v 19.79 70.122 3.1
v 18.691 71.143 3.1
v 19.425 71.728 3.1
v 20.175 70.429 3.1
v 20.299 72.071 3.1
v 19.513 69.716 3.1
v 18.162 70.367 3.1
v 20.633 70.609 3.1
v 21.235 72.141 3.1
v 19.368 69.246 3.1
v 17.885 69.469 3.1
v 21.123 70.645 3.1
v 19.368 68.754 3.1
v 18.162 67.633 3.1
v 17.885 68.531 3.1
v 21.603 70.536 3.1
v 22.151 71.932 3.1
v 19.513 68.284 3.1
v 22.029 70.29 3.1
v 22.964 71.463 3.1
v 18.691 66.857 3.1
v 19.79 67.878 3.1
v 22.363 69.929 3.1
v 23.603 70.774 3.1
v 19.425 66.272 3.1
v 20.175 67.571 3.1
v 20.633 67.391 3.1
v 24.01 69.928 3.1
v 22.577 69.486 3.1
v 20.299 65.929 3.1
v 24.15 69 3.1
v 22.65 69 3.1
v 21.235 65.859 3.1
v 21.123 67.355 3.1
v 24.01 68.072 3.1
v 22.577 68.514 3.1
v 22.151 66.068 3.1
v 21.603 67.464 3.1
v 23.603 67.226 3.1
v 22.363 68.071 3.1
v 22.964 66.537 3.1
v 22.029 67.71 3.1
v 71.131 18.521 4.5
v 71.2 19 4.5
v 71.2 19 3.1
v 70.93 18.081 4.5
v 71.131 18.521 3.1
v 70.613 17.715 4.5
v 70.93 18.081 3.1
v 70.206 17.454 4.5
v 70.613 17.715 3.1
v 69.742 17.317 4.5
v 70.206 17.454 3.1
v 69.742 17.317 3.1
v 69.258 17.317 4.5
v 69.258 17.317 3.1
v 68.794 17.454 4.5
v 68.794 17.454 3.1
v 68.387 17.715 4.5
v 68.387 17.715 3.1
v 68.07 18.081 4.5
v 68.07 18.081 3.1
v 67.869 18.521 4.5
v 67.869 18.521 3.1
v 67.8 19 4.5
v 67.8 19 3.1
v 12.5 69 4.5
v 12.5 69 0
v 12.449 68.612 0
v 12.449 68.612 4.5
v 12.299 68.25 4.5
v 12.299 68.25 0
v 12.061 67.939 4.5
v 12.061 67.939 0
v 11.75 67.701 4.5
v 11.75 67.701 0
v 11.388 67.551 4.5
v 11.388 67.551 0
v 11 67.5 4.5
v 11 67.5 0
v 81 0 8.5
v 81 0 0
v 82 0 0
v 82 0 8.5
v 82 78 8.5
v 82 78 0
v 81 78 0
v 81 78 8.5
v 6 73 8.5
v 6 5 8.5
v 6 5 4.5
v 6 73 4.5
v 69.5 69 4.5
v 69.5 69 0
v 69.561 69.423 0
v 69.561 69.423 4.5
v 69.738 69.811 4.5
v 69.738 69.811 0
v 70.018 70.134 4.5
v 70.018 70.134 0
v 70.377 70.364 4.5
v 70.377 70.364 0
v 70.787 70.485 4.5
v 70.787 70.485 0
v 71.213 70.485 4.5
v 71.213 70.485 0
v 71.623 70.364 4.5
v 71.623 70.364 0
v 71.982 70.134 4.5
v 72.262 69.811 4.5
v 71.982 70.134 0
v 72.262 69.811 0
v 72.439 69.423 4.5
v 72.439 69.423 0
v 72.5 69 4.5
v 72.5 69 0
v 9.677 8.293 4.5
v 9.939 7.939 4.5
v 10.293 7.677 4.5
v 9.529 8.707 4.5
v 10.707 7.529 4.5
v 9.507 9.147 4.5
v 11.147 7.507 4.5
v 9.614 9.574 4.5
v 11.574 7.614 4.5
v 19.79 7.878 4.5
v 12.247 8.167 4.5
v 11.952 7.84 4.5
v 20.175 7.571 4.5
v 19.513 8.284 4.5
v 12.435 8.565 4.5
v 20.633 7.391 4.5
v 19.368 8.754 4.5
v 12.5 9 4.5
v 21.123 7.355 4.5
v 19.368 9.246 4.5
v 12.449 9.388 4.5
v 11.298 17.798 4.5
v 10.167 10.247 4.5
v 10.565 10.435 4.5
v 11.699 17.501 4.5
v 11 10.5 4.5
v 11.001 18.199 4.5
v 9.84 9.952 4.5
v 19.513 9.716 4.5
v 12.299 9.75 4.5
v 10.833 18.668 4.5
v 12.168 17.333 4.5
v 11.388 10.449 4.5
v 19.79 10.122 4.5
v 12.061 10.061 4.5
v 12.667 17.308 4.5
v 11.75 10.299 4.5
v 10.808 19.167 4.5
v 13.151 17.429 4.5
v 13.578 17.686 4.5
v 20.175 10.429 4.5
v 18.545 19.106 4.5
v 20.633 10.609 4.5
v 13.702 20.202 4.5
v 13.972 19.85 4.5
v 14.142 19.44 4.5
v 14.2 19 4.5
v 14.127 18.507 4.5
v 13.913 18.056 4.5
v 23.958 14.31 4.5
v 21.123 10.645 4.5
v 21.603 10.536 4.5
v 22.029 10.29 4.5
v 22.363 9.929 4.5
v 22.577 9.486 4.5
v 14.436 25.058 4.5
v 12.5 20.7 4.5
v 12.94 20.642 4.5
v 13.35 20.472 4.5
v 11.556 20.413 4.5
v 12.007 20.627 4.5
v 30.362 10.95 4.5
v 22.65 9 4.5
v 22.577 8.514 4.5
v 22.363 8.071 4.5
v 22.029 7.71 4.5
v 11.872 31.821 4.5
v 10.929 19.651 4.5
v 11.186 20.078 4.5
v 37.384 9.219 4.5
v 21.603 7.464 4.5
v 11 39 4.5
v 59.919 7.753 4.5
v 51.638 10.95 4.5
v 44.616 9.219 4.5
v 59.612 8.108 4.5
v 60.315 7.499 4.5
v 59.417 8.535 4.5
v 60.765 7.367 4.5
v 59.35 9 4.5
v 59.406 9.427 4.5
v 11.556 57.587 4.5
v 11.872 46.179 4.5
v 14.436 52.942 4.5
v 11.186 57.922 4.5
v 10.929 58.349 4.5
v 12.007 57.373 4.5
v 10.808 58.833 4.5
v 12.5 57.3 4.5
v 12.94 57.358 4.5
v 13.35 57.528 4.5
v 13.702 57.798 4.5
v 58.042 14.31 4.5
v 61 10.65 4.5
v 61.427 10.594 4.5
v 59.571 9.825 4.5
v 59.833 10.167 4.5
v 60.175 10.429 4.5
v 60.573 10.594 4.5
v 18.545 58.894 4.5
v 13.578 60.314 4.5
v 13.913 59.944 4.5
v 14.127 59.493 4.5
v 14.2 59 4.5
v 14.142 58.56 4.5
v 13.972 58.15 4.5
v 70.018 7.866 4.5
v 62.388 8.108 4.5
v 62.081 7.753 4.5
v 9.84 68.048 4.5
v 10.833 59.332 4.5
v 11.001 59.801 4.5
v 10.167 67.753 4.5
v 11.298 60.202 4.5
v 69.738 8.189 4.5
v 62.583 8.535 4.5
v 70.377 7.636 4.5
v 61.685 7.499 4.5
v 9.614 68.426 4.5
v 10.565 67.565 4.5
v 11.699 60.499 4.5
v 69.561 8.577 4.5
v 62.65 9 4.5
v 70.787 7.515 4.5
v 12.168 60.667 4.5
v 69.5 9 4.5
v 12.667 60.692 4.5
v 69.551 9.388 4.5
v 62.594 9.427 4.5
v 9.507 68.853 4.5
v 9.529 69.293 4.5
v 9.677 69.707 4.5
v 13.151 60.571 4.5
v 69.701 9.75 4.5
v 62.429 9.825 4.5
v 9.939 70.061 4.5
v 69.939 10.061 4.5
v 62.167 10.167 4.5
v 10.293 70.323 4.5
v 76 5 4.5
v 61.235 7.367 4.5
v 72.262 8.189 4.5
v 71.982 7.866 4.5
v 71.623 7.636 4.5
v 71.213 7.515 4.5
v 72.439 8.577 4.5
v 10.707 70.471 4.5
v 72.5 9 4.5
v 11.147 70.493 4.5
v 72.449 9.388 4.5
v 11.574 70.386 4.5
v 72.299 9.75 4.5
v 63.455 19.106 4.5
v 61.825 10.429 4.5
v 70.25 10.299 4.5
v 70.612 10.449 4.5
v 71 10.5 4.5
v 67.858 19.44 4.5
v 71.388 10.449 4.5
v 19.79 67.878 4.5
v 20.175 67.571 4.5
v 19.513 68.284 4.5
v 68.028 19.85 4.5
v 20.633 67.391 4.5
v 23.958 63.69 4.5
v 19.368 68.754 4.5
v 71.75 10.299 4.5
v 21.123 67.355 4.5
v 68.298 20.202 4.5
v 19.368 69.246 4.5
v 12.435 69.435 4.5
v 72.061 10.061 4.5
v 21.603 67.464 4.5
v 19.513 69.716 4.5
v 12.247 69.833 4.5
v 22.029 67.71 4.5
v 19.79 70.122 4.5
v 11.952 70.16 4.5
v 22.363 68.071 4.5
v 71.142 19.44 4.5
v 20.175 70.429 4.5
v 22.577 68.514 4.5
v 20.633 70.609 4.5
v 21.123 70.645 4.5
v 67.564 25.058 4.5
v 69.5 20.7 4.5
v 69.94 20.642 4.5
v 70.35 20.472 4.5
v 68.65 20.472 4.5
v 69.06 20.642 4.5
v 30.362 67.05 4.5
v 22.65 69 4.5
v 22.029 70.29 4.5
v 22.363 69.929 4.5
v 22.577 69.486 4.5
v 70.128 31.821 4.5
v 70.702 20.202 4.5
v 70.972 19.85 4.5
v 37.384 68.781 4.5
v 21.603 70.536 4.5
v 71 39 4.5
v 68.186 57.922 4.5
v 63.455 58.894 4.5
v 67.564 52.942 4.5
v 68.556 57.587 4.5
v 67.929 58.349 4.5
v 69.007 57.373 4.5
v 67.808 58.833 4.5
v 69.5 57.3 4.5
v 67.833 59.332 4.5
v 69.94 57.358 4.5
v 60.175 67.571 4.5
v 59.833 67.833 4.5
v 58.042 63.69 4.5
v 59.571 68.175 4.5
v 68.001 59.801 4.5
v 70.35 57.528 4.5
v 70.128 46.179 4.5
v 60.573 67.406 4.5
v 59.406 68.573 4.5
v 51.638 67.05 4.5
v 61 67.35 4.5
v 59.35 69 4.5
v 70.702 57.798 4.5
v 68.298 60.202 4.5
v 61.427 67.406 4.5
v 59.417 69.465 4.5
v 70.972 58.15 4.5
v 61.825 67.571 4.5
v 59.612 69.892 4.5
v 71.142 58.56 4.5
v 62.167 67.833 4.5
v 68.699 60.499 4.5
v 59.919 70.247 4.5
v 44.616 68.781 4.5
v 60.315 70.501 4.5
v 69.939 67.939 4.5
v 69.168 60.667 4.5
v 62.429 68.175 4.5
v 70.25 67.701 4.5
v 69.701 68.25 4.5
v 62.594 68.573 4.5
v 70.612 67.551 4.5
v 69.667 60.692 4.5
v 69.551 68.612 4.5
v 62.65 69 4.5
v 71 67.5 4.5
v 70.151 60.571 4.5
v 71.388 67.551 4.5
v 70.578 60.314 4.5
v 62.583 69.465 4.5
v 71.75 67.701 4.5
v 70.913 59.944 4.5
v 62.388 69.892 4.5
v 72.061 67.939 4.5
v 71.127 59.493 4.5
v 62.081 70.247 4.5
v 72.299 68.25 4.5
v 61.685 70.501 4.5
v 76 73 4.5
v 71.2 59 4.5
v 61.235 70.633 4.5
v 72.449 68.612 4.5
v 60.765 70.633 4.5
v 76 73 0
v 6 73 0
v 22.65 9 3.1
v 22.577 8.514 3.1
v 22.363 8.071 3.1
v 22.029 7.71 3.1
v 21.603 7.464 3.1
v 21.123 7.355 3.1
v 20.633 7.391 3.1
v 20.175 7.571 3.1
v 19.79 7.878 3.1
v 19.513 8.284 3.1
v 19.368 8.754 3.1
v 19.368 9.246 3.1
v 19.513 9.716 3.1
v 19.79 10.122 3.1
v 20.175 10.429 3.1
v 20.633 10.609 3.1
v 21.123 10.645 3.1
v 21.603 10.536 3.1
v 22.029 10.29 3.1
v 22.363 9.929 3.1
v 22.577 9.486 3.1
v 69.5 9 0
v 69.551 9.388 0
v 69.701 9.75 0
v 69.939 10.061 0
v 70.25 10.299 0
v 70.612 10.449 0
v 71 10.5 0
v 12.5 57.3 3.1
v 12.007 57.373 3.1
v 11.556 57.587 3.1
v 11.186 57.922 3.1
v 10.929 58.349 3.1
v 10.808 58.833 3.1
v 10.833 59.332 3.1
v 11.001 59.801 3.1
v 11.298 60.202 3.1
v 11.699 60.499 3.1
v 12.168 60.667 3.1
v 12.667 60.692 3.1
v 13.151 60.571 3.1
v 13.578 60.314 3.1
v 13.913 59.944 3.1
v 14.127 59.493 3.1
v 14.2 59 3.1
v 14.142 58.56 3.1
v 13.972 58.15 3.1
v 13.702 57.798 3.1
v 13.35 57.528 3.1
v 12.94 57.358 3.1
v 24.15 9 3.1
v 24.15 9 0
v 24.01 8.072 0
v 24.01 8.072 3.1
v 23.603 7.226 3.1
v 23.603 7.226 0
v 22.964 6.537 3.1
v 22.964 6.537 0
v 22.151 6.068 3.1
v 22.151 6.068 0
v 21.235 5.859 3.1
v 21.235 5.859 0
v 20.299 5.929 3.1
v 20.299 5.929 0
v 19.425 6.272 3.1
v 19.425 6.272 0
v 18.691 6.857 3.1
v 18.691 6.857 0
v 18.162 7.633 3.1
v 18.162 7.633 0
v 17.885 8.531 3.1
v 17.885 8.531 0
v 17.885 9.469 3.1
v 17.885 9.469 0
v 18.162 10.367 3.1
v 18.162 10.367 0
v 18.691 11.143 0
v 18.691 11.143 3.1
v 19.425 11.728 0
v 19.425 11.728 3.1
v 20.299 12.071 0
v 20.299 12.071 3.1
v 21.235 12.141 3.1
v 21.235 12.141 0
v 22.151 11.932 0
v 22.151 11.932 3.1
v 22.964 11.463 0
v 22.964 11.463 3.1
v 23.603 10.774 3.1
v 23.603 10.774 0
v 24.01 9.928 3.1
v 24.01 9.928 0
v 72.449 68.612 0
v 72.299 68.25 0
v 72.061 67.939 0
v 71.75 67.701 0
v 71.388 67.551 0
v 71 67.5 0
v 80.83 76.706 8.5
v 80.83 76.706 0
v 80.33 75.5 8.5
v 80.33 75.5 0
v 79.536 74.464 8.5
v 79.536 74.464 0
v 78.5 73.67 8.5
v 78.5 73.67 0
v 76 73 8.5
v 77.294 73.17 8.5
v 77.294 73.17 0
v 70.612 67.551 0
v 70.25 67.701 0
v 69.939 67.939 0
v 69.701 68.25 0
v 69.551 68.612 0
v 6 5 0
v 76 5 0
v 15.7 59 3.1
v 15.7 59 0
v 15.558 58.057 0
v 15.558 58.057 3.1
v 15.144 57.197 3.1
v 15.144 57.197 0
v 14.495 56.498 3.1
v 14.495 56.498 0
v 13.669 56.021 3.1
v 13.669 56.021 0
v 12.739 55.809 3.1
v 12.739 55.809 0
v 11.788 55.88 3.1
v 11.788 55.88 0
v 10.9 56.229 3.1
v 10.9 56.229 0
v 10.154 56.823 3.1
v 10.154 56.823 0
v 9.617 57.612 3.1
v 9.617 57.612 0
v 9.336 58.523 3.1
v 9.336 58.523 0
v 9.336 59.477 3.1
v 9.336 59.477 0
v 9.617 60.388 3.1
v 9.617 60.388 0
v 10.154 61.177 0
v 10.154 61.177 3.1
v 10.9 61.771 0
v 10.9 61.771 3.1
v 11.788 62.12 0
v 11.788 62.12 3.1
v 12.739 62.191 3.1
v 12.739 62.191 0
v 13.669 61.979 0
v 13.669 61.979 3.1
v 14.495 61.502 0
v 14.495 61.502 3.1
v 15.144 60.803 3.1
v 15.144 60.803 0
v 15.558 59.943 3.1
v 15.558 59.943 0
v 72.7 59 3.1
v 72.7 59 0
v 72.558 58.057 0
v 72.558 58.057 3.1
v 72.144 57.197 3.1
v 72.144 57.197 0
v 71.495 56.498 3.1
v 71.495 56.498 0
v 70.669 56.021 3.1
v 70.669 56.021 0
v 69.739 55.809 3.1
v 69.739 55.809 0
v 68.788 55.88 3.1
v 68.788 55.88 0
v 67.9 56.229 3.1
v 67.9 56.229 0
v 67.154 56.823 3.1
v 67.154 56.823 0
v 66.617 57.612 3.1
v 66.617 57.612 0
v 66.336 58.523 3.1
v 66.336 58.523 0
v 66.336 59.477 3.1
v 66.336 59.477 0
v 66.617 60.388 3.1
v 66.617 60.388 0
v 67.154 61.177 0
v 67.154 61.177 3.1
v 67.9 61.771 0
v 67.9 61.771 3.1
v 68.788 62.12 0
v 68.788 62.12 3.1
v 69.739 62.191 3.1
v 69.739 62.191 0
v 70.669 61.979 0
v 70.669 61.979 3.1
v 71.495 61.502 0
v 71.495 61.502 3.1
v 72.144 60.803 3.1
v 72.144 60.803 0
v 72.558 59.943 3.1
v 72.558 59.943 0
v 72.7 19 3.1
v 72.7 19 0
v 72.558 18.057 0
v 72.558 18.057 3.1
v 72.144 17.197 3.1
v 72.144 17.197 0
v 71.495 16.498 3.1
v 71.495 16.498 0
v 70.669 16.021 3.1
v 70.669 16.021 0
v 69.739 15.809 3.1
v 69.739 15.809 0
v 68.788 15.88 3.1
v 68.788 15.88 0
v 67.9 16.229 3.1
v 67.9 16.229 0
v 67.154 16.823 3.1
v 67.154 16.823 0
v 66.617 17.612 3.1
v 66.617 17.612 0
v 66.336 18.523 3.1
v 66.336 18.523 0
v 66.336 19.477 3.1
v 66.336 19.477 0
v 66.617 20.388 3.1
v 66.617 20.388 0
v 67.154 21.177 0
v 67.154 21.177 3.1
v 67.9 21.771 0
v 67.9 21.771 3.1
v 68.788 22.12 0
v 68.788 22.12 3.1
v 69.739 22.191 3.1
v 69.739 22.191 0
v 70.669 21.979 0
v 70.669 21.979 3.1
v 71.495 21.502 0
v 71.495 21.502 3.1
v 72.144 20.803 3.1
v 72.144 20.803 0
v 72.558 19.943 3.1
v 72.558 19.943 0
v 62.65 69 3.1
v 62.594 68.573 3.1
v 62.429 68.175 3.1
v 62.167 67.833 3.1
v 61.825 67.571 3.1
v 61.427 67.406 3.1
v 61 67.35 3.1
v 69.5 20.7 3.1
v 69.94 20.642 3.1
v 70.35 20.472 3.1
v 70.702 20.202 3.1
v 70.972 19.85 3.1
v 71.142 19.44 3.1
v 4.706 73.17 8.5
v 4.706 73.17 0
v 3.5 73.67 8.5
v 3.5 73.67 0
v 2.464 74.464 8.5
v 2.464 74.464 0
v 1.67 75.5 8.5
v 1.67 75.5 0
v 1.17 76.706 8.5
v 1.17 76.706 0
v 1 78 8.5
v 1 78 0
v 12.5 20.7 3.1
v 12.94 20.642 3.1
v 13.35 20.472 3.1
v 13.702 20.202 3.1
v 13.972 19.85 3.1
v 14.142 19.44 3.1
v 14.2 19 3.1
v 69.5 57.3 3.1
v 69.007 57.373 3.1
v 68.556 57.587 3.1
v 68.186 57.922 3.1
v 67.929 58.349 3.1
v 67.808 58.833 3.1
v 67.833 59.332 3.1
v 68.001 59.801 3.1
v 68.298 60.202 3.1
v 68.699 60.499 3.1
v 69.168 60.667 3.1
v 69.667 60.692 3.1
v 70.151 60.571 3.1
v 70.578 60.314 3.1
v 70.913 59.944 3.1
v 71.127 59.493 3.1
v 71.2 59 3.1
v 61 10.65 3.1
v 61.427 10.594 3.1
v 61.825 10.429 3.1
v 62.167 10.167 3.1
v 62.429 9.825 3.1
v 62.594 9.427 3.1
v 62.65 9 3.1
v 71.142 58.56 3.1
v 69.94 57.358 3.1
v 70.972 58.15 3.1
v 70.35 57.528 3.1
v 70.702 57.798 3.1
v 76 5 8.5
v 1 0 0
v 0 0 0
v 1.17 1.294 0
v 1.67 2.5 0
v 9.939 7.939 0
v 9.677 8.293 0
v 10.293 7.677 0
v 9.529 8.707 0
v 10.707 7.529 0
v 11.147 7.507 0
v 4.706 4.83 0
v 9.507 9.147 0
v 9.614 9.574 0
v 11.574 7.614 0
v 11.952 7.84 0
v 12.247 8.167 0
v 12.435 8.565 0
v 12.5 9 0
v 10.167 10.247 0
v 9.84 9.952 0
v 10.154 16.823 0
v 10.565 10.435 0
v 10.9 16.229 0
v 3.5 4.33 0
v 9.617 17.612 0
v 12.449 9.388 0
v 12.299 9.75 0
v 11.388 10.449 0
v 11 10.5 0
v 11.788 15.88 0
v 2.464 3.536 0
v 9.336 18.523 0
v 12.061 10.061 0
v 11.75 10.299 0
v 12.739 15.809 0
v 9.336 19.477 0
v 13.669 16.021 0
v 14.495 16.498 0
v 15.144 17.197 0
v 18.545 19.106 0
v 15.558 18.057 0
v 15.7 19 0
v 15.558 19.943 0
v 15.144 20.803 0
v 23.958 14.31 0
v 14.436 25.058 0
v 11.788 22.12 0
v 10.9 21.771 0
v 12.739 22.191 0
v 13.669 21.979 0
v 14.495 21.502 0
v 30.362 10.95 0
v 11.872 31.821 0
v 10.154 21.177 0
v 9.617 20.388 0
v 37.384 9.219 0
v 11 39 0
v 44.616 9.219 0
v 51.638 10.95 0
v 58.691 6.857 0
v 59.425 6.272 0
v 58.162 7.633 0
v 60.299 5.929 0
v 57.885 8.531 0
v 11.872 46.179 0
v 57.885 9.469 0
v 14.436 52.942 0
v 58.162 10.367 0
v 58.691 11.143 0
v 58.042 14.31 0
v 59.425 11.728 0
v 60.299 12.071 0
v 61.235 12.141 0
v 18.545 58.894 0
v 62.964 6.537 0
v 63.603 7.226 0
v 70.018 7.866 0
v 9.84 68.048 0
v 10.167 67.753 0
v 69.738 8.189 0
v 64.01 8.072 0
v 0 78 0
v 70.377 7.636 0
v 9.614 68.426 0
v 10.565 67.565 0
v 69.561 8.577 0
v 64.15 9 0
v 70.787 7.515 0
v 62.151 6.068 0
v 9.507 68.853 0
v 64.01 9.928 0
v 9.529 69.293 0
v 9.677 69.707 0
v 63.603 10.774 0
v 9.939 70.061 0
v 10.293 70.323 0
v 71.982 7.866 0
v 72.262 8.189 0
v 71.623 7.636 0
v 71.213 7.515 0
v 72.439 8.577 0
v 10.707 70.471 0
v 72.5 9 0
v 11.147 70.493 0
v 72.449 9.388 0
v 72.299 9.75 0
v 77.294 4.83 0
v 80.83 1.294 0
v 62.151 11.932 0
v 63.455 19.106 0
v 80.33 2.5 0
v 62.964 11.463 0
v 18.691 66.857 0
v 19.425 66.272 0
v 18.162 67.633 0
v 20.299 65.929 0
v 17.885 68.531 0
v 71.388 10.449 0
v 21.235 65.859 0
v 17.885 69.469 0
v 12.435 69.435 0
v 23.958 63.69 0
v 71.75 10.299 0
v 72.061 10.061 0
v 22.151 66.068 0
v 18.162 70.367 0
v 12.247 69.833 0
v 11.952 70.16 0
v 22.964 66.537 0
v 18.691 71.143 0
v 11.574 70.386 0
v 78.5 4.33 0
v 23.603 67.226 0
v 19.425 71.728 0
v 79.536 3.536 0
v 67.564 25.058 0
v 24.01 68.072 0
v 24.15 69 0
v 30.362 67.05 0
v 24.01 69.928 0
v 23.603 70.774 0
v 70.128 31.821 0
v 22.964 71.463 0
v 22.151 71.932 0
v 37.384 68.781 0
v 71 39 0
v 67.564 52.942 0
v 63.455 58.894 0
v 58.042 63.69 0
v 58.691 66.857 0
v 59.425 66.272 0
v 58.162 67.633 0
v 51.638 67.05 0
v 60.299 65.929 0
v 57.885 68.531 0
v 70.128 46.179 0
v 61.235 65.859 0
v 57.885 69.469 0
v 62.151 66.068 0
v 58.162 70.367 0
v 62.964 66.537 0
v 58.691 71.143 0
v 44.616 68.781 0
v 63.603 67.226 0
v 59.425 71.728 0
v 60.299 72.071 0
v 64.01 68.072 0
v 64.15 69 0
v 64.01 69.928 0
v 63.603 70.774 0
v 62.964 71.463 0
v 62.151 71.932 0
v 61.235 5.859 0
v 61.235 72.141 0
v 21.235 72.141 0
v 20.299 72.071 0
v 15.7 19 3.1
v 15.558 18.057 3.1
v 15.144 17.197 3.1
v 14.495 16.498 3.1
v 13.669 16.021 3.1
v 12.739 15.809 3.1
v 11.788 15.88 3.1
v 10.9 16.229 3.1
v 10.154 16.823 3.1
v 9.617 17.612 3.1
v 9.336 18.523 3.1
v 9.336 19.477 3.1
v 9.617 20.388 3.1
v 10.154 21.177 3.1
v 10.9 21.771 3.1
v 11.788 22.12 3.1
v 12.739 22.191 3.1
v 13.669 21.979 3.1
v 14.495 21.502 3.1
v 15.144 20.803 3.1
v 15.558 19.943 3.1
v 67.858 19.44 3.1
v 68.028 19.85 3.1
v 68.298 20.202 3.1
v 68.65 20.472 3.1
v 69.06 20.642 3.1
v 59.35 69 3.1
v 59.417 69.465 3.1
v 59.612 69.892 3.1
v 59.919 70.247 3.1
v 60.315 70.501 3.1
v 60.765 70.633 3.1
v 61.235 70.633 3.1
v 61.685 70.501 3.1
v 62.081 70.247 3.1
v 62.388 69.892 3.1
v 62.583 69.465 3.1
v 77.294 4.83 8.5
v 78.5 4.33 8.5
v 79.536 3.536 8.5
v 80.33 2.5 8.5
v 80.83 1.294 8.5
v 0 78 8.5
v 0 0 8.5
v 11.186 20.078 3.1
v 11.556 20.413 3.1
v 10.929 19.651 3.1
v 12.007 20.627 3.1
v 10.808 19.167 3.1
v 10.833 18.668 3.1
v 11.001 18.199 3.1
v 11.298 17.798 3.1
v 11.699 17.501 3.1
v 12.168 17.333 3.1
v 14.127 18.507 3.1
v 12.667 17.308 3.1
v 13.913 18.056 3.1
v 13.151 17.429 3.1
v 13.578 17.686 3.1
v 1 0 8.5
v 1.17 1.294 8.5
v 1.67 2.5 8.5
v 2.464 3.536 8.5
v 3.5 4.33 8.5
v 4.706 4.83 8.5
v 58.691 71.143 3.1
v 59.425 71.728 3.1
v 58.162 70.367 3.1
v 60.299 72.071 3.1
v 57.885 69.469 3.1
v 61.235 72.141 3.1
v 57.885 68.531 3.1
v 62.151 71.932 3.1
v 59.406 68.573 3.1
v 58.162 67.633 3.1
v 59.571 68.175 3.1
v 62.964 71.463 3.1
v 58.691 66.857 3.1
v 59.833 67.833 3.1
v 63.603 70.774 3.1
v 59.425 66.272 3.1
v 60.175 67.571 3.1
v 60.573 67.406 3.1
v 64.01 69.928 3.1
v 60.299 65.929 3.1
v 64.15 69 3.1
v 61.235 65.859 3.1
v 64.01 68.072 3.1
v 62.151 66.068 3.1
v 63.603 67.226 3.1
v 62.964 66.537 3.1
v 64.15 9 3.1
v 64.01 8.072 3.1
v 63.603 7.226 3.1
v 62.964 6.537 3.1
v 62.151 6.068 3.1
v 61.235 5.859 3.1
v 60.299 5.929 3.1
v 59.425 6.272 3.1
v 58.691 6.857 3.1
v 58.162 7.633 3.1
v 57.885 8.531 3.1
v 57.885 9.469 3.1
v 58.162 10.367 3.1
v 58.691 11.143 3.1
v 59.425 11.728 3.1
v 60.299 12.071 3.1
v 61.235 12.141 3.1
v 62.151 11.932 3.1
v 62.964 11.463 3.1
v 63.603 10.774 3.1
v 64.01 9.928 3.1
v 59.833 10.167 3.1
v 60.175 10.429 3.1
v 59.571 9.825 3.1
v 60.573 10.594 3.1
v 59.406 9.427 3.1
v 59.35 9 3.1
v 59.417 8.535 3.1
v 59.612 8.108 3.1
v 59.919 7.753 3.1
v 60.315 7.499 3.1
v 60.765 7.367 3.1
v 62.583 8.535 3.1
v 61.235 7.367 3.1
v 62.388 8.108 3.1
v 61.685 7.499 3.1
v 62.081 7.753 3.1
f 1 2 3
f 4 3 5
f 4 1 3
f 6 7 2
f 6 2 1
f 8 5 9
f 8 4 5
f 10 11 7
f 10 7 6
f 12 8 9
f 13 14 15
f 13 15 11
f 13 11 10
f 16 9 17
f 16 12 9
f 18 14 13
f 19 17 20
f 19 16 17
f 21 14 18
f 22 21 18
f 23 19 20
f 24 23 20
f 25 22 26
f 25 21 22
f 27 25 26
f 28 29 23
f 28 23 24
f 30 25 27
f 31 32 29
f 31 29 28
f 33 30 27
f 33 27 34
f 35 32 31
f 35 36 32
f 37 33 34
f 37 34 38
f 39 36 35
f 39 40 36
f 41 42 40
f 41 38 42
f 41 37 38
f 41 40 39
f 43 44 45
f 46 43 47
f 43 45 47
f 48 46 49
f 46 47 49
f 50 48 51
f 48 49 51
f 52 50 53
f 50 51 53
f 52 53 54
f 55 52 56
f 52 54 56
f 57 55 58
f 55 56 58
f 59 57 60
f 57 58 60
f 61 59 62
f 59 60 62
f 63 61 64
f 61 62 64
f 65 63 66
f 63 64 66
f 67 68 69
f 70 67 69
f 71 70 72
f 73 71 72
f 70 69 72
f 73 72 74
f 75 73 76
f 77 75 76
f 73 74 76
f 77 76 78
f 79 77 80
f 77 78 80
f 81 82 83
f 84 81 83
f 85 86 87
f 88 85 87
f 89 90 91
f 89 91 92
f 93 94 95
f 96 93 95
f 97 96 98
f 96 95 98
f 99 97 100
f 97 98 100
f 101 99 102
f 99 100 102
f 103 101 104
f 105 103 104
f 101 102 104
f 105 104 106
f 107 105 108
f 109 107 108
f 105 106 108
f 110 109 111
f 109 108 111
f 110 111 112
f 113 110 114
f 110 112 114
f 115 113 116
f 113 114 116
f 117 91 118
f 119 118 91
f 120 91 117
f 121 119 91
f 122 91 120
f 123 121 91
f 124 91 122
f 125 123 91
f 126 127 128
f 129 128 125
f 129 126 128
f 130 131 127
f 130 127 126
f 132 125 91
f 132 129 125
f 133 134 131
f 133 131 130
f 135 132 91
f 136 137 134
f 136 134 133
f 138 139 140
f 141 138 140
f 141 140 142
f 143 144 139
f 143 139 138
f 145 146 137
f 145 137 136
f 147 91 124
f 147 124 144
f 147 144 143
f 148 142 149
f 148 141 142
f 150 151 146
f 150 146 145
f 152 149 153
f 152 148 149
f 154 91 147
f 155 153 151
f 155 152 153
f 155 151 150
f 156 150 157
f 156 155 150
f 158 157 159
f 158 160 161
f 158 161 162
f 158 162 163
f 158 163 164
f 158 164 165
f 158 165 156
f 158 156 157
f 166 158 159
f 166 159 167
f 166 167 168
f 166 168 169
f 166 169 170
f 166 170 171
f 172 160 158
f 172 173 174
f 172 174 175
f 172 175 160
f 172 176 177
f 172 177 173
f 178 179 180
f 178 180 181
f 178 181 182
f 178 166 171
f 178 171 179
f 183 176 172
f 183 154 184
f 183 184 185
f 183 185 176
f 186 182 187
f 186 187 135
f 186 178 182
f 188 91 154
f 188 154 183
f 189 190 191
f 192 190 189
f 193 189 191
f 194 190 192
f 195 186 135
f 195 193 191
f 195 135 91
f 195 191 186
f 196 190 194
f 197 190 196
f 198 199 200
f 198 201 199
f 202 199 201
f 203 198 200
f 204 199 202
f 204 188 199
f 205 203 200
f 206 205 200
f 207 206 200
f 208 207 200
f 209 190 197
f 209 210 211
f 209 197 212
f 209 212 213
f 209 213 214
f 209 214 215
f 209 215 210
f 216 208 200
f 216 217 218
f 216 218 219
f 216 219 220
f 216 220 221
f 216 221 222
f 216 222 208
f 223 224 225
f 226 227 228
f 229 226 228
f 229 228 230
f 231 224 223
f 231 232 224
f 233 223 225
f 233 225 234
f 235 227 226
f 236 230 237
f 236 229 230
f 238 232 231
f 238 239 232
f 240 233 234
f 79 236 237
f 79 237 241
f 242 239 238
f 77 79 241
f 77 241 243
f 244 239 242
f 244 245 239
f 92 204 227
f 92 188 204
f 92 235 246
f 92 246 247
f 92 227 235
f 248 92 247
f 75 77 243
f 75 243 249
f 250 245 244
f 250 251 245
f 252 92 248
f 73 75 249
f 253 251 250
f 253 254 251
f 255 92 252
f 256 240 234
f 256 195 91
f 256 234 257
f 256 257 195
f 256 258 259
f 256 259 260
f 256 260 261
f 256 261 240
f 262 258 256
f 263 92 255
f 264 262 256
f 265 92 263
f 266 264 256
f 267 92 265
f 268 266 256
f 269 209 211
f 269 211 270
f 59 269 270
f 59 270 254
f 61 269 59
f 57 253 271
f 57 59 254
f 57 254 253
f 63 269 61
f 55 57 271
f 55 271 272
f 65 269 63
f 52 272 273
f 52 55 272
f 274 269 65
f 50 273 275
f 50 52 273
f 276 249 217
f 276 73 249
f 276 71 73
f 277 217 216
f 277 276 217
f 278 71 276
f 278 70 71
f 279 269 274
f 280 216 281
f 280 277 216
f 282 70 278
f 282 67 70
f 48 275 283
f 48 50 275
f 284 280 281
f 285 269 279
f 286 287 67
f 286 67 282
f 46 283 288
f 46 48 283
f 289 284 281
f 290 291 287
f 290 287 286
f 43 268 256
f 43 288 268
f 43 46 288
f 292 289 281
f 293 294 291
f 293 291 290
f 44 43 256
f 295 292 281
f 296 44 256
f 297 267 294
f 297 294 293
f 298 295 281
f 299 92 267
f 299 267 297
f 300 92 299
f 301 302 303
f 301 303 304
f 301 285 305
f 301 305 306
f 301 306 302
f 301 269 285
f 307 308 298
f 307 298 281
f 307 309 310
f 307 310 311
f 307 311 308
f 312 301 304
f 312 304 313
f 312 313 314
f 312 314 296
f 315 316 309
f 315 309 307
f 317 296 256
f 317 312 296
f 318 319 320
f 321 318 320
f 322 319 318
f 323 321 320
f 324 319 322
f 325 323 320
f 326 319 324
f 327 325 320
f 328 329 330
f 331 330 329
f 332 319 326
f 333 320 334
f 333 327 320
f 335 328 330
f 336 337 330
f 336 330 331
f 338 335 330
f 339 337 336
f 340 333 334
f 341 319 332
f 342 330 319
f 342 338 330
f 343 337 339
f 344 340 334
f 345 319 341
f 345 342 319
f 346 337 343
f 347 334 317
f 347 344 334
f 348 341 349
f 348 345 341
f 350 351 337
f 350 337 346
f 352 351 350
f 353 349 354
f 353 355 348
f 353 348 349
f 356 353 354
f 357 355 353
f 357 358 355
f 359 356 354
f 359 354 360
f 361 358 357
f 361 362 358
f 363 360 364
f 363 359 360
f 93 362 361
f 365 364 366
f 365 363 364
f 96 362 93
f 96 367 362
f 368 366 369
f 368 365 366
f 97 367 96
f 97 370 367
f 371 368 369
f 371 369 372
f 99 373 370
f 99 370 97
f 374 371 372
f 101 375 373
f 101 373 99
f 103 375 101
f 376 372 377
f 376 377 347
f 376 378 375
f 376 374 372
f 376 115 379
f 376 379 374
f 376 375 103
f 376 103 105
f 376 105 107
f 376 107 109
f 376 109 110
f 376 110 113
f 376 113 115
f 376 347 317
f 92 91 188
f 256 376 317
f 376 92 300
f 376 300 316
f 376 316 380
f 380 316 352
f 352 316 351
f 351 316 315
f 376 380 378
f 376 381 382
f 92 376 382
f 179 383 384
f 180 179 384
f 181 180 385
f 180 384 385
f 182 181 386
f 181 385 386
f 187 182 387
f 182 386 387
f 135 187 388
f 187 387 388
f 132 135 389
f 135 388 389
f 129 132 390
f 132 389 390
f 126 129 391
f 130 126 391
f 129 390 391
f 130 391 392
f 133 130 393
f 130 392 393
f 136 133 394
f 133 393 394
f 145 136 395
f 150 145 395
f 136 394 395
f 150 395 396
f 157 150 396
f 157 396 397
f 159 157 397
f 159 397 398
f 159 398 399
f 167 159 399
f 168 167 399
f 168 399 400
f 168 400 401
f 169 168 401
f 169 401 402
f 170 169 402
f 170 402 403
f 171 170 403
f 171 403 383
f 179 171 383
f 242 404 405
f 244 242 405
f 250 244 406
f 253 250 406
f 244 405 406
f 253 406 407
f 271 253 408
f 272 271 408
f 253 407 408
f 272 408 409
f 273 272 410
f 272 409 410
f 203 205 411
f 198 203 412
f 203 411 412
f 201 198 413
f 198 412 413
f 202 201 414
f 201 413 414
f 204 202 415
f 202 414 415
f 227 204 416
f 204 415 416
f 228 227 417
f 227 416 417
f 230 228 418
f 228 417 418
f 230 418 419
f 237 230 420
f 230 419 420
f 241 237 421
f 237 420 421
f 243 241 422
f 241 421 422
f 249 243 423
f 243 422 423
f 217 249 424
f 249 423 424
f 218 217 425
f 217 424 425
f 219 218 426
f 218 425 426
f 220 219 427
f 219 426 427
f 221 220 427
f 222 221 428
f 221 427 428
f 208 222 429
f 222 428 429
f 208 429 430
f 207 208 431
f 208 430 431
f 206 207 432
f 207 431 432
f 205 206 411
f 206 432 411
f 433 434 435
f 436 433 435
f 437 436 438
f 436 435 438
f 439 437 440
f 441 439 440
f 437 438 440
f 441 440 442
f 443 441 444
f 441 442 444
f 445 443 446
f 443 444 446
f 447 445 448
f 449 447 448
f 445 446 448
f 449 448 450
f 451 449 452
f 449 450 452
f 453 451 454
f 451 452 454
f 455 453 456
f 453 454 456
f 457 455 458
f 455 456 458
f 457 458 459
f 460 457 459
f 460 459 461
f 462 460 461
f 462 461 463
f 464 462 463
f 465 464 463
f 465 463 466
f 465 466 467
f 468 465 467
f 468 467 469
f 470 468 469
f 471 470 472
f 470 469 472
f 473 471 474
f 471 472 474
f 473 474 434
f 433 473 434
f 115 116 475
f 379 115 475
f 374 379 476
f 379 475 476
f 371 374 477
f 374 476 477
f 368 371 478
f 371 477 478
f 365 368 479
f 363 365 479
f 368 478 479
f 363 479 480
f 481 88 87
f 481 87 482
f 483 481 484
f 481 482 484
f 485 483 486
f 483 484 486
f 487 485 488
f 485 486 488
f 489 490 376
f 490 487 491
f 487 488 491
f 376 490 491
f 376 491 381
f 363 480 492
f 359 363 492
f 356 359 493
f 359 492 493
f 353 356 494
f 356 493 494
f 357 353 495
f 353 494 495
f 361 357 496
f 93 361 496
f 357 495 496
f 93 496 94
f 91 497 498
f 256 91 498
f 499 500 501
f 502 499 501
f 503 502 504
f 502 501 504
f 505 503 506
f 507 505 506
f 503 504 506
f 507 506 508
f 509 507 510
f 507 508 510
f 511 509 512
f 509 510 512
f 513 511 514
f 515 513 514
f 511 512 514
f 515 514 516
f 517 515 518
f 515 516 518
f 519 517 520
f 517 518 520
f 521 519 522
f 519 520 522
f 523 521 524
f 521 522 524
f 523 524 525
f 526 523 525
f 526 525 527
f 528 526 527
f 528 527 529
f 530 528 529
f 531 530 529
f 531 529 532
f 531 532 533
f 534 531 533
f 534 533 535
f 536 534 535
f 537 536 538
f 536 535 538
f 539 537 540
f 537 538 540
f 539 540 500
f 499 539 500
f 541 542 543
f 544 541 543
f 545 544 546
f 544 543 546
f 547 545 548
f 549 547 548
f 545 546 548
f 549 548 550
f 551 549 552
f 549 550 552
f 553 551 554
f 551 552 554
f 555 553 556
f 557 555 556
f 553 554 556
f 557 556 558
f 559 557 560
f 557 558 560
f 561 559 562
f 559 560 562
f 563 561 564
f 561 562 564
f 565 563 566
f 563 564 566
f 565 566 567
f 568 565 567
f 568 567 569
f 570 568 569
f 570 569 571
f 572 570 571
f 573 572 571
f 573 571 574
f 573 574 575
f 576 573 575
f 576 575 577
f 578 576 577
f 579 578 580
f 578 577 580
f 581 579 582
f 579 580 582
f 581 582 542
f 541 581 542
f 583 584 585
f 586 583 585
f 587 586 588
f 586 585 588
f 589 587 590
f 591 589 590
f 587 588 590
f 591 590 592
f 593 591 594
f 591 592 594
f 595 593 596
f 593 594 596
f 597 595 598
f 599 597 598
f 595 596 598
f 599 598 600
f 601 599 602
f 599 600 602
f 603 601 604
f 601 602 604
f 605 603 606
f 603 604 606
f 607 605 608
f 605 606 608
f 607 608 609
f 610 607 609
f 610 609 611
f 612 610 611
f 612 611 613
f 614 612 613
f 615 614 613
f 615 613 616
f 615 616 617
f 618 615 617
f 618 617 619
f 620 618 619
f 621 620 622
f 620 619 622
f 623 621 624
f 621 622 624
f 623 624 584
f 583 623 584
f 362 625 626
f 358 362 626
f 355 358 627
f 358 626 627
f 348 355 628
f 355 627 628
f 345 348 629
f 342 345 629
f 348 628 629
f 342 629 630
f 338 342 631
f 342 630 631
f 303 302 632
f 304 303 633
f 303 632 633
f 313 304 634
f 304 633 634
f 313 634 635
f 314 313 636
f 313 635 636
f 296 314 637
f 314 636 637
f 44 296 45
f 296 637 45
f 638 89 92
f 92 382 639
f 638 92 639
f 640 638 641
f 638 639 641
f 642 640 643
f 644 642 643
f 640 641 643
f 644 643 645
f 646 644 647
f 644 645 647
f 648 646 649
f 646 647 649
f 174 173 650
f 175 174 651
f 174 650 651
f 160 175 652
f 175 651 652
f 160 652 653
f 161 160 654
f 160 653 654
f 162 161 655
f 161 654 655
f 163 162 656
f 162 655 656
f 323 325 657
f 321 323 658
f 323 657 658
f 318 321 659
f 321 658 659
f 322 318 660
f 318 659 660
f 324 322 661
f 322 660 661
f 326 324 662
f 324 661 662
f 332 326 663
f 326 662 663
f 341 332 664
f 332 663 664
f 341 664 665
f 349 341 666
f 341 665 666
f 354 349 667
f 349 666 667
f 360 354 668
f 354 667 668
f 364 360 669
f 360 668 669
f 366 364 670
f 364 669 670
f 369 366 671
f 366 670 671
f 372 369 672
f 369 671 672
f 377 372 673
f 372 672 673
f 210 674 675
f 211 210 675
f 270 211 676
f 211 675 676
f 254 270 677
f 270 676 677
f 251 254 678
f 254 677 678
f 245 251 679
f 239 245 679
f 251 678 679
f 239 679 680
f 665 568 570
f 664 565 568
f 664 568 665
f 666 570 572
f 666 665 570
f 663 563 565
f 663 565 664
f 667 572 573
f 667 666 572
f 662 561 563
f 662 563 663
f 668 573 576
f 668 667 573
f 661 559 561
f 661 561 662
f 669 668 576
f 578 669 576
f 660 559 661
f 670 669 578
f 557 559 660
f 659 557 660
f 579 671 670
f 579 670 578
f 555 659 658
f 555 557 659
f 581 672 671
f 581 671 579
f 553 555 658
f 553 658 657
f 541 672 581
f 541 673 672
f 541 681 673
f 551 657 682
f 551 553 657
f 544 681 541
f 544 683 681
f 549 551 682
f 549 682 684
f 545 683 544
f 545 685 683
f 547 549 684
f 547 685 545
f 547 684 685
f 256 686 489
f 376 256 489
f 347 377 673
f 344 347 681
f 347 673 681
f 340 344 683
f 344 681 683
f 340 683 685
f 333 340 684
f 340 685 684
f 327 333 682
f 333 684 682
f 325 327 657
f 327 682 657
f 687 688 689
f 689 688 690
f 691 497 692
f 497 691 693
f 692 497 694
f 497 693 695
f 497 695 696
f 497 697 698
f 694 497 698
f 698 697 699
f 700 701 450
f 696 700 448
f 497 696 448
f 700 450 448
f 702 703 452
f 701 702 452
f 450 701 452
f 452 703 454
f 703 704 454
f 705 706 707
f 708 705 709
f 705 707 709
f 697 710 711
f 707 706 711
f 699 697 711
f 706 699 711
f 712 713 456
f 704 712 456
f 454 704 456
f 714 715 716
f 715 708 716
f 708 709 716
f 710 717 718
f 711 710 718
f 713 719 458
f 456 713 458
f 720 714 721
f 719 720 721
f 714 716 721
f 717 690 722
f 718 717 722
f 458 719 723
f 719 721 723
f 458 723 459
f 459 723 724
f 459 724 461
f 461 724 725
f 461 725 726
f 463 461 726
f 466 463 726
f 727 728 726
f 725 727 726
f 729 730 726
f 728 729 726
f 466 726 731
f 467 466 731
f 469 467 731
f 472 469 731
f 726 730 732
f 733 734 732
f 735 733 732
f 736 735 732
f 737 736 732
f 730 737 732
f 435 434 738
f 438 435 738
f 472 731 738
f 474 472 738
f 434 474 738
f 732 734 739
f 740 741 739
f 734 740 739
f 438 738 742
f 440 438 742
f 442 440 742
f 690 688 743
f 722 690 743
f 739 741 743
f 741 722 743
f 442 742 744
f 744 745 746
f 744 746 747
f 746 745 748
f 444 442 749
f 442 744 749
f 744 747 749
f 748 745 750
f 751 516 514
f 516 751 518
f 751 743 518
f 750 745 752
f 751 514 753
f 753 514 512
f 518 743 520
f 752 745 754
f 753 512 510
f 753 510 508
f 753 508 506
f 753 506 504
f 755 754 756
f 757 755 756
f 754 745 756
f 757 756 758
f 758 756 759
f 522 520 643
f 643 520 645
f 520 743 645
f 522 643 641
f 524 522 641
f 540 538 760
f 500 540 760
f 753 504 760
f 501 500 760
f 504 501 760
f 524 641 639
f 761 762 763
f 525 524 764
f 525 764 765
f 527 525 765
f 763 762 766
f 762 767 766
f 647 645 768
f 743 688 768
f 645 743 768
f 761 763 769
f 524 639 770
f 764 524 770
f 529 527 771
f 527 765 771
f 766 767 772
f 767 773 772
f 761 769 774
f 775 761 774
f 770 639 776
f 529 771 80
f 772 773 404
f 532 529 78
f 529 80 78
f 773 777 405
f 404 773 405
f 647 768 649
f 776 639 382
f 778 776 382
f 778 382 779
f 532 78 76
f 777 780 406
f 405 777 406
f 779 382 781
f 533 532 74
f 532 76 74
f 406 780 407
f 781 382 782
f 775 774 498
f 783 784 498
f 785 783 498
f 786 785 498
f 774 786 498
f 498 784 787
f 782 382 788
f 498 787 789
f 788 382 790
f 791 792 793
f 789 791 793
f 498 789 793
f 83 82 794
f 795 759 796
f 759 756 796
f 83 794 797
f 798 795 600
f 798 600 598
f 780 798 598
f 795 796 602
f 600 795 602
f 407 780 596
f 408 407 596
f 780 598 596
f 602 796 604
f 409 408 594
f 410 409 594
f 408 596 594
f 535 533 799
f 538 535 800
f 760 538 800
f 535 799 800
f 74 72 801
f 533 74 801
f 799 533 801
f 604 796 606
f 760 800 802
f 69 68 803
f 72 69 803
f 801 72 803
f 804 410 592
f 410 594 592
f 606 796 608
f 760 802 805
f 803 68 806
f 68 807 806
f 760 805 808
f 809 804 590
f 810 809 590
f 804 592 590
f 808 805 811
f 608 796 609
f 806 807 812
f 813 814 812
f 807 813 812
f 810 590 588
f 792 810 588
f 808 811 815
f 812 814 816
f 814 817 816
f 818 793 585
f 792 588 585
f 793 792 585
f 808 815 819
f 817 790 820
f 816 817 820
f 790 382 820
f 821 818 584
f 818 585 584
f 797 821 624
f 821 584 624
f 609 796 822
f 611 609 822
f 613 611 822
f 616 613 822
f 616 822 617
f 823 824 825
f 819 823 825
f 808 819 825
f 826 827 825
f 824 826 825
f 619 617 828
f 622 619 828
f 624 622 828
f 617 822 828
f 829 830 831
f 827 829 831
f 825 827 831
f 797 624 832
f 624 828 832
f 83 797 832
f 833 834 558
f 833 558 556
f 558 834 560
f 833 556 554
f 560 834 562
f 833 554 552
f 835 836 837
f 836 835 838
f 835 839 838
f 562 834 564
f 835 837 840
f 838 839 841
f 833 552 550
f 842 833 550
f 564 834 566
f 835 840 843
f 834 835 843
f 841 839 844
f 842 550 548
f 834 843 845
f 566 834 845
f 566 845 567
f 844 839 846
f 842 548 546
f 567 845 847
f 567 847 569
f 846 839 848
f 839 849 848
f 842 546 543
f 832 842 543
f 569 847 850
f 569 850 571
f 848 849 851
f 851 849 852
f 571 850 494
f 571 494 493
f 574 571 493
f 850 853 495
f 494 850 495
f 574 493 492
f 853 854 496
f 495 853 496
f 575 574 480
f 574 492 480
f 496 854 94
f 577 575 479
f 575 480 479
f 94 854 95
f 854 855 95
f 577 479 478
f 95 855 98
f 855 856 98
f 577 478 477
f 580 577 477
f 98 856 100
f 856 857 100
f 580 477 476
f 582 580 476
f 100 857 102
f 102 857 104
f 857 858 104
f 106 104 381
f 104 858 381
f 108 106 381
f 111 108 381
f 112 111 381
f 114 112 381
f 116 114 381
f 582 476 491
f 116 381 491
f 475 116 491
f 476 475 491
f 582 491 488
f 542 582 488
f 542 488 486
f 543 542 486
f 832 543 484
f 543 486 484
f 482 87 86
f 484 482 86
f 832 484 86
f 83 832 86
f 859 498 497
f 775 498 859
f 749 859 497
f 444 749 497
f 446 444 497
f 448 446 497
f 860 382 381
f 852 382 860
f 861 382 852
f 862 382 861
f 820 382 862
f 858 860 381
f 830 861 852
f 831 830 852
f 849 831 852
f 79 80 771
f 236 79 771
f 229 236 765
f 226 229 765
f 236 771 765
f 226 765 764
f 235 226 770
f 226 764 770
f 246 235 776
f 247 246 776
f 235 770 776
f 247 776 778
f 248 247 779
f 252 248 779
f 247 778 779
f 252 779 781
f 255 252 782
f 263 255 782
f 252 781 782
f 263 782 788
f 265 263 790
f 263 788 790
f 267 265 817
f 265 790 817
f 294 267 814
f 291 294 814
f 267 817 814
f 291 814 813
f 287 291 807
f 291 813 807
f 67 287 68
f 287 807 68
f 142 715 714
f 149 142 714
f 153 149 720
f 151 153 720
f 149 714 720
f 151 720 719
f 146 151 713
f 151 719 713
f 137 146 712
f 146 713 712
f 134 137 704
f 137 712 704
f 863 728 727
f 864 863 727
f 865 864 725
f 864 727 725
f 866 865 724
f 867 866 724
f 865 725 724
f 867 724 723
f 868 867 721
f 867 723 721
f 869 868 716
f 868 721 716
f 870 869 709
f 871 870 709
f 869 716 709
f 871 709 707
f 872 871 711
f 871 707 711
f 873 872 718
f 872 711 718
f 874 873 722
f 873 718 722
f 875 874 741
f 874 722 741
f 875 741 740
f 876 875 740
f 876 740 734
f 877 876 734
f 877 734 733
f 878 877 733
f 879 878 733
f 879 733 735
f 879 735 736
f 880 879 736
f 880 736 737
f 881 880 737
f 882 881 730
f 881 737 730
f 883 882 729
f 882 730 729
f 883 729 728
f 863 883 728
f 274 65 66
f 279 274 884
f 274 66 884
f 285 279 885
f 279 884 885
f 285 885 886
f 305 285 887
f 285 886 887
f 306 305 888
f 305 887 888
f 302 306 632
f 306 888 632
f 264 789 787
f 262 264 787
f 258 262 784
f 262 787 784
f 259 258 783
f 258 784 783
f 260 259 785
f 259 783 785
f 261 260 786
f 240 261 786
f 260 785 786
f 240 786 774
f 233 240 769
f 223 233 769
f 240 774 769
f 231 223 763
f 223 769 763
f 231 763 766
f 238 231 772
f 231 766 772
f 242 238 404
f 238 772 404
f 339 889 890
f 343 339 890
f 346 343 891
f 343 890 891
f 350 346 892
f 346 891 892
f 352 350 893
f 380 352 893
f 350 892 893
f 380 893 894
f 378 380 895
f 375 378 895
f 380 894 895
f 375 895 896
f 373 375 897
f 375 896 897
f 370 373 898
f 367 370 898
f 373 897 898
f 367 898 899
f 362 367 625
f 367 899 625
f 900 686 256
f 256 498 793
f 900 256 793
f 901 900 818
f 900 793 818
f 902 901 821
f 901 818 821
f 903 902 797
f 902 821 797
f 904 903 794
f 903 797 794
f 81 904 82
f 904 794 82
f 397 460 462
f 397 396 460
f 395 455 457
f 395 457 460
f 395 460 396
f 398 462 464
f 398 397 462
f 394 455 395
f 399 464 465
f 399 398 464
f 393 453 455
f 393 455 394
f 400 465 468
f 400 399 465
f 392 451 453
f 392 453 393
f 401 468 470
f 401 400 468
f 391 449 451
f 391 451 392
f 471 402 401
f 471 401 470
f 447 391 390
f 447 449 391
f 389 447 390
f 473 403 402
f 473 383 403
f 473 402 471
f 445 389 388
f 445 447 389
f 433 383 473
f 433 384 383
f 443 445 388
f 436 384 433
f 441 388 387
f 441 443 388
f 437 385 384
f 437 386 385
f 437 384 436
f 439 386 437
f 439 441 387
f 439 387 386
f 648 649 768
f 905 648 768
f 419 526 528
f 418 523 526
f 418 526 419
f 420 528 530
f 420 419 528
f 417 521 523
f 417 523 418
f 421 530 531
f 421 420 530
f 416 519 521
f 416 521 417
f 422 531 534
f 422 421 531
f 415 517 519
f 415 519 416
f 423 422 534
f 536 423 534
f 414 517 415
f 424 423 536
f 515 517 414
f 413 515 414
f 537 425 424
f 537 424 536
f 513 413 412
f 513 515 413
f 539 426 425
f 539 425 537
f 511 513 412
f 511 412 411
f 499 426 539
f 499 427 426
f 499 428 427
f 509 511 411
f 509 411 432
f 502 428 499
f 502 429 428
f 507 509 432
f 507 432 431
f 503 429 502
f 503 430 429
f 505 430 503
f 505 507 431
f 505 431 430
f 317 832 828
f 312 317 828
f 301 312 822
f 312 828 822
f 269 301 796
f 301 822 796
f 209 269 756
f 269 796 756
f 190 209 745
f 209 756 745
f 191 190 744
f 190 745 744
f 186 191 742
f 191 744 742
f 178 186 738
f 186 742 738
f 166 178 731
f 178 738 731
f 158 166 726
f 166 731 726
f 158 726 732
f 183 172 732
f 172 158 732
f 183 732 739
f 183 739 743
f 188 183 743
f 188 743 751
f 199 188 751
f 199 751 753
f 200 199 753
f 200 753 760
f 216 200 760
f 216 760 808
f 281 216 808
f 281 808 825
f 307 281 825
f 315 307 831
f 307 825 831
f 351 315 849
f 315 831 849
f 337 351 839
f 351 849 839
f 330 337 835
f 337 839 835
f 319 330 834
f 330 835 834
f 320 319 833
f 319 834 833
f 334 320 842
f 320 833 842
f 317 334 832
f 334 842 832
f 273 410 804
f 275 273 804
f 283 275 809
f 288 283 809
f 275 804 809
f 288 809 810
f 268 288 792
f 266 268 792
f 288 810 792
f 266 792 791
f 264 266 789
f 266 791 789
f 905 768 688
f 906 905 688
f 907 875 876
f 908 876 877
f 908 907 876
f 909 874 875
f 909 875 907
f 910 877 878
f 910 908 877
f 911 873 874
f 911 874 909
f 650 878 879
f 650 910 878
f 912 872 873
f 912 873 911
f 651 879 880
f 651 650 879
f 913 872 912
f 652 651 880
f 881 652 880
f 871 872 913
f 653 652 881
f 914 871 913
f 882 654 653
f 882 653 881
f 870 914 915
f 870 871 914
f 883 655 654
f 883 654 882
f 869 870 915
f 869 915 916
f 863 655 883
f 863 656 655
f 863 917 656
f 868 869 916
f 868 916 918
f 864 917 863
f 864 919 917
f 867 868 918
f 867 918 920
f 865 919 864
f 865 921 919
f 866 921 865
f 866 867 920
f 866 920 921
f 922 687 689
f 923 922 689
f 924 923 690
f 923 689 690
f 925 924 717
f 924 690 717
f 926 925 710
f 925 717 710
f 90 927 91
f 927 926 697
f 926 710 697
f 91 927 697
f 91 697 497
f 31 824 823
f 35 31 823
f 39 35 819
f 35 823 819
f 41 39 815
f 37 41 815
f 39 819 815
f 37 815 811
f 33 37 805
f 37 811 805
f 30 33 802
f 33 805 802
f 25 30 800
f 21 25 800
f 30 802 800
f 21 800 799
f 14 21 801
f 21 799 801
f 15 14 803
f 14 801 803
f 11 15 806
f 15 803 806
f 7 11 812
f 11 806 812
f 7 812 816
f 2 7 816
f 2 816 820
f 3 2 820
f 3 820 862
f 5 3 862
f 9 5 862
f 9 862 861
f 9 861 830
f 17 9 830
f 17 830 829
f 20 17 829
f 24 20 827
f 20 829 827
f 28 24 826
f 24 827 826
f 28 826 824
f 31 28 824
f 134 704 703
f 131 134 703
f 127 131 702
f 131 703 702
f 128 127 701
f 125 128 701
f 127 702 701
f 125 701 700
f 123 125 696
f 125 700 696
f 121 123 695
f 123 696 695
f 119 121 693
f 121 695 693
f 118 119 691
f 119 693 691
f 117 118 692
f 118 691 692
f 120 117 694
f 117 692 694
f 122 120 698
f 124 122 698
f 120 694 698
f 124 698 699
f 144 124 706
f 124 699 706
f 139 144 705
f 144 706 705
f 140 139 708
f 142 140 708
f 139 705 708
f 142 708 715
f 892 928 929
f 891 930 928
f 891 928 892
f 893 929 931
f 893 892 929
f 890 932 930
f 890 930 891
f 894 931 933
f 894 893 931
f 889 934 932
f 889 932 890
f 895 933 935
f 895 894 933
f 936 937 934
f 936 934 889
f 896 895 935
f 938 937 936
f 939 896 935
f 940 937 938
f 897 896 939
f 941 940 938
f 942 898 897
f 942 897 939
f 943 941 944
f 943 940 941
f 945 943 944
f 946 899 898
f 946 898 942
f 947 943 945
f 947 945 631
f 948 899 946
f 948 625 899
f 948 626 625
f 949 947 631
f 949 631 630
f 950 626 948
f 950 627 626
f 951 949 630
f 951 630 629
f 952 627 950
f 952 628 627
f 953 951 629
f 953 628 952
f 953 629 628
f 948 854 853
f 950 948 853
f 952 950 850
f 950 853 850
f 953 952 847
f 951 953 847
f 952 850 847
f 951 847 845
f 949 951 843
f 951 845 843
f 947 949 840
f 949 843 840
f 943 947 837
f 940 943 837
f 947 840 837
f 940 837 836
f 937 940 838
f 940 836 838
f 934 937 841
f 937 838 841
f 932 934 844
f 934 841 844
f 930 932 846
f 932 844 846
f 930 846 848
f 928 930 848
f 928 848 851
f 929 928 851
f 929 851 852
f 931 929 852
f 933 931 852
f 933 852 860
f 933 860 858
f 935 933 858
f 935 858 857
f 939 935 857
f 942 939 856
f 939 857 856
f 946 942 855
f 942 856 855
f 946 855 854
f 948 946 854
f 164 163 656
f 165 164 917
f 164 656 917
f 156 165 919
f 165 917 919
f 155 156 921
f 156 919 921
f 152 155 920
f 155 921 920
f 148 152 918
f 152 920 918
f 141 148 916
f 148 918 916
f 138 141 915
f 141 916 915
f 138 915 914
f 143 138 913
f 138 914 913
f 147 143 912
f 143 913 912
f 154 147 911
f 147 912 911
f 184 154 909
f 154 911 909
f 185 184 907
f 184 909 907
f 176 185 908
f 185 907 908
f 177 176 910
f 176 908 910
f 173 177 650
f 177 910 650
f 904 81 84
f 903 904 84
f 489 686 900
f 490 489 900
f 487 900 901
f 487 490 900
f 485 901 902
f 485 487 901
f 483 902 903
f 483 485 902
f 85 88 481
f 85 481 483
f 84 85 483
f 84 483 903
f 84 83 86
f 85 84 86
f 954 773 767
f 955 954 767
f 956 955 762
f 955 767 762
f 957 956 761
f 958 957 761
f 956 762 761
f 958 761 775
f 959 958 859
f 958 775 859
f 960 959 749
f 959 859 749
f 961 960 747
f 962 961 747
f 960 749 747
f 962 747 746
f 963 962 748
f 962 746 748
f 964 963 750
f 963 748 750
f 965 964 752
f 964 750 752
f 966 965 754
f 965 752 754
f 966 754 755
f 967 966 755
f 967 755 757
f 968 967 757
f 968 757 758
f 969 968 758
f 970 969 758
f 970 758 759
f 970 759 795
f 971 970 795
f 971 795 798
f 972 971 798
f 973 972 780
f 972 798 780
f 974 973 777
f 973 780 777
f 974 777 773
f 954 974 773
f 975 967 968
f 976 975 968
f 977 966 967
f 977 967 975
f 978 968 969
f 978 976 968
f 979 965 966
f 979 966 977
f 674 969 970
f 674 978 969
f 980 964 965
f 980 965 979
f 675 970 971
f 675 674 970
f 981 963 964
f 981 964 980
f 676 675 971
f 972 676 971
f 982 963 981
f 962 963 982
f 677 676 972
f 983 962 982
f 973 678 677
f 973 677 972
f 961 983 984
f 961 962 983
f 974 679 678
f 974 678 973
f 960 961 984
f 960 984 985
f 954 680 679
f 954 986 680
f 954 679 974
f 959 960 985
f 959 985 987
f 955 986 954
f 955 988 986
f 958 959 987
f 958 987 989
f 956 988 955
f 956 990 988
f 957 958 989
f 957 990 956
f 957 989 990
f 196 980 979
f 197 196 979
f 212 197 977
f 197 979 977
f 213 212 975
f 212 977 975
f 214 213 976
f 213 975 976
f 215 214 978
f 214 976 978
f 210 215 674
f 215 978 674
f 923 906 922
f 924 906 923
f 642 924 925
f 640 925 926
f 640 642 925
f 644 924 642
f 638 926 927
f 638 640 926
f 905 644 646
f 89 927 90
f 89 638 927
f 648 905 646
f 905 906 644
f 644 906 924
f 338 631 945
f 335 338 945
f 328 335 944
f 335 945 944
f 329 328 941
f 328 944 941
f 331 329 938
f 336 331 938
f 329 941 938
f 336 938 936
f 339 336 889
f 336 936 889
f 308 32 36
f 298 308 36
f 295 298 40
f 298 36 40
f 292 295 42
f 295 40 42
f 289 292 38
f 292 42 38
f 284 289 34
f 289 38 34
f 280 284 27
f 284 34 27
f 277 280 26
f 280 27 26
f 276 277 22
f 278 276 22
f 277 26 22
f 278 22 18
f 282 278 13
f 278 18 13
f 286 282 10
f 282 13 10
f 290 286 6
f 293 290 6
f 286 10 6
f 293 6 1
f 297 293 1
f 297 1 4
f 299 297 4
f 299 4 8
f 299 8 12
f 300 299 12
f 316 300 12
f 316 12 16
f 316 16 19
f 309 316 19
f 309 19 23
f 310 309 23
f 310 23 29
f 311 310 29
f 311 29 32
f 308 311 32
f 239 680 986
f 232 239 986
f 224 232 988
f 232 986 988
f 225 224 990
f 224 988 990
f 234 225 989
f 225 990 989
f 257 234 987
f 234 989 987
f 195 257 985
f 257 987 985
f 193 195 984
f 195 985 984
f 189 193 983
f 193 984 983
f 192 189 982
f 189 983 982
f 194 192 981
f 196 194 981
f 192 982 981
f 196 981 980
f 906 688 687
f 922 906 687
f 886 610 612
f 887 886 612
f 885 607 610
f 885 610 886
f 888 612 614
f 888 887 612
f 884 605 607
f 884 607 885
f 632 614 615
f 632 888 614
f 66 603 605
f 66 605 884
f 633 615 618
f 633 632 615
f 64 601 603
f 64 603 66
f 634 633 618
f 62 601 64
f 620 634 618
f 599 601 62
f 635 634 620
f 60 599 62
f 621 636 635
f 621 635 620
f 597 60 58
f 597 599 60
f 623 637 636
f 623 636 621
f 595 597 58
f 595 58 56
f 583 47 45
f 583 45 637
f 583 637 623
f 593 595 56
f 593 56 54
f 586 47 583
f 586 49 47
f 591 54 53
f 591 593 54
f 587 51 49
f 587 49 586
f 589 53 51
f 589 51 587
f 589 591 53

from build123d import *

# Parameters (mm, degrees)
F1_DEPTH  = 8.5
F2_W      = 70
F2_H      = 68
F2_R      = 30
F3_DEPTH  = 4
F5_DEPTH  = 25
F6_R      = 3.2
F6_R_2    = 1.7
F7_DEPTH  = 3.1
F8_R      = 1.65
F9_DEPTH  = 25
F10_R     = 3.15
F11_DEPTH = 3.1
F13_DEPTH = 25


with BuildPart() as f1:
    # F0 (on Top) → F1 (new body)
    with BuildSketch(Plane.XY):
        with BuildLine():
            Line((0, 78), (0, 39))
            Line((0, 39), (11, 39))
            ThreePointArc((11, 39), (41, 69), (71, 39))
            Line((71, 39), (82, 39))
            Line((82, 39), (82, 78))
            Line((82, 78), (81, 78))
            ThreePointArc((81, 78), (79.535534, 74.464466), (76, 73))
            Line((76, 73), (6, 73))
            ThreePointArc((6, 73), (2.464466, 74.464466), (1, 78))
            Line((1, 78), (0, 78))
        make_face()
        with BuildLine():
            Line((0, 39), (0, 0))
            Line((0, 0), (1, 0))
            ThreePointArc((1, 0), (2.464466, 3.535534), (6, 5))
            Line((6, 5), (76, 5))
            ThreePointArc((76, 5), (79.535534, 3.535534), (81, 0))
            Line((81, 0), (82, 0))
            Line((82, 0), (82, 39))
            Line((82, 39), (71, 39))
            ThreePointArc((71, 39), (41, 9), (11, 39))
            Line((11, 39), (0, 39))
        make_face()
    extrude(amount=F1_DEPTH)

    # F2 (on face) → F3 (cut)
    with BuildSketch(Plane.XY.offset(8.5)):
        with Locations((41, 39)):
            Rectangle(F2_W, F2_H)
        with Locations((41, 39)):
            Circle(F2_R, mode=Mode.SUBTRACT)
    extrude(amount=-F3_DEPTH, mode=Mode.SUBTRACT)

    # F4 (on face) → F5 (cut)
    with BuildSketch(Plane(origin=(0, 0, 0), x_dir=(1, 0, 0), z_dir=(0, 0, -1))):
        with BuildLine():
            ThreePointArc((14.2, -19), (11.297918, -17.797918), (12.5, -20.7))
            ThreePointArc((12.5, -20.7), (13.702082, -20.202082), (14.2, -19))
        make_face()
        with BuildLine():
            ThreePointArc((14.2, -59), (13.702082, -57.797918), (12.5, -57.3))
            ThreePointArc((12.5, -57.3), (11.297918, -60.202082), (14.2, -59))
        make_face()
        with BuildLine():
            ThreePointArc((71.2, -59), (70.702082, -57.797918), (69.5, -57.3))
            ThreePointArc((69.5, -57.3), (68.297918, -60.202082), (71.2, -59))
        make_face()
        with BuildLine():
            ThreePointArc((71.2, -19), (69.5, -17.3), (67.8, -19))
            ThreePointArc((67.8, -19), (68.297918, -20.202082), (69.5, -20.7))
            ThreePointArc((69.5, -20.7), (70.702082, -20.202082), (71.2, -19))
        make_face()
    extrude(amount=-F5_DEPTH, mode=Mode.SUBTRACT)

    # F6 (on face) → F7 (cut)
    with BuildSketch(Plane(origin=(0, 0, 0), x_dir=(1, 0, 0), z_dir=(0, 0, -1))):
        with Locations((12.5, -19)):
            Circle(F6_R)
        with Locations((12.5, -19)):
            Circle(F6_R_2, mode=Mode.SUBTRACT)
        with Locations((12.5, -59)):
            Circle(F6_R)
        with Locations((12.5, -59)):
            Circle(F6_R_2, mode=Mode.SUBTRACT)
        with Locations((69.5, -19)):
            Circle(F6_R)
        with Locations((69.5, -19)):
            Circle(F6_R_2, mode=Mode.SUBTRACT)
        with Locations((69.5, -59)):
            Circle(F6_R)
        with Locations((69.5, -59)):
            Circle(F6_R_2, mode=Mode.SUBTRACT)
    extrude(amount=-F7_DEPTH, mode=Mode.SUBTRACT)

    # F8 (on face) → F9 (cut)
    with BuildSketch(Plane(origin=(0, 0, 0), x_dir=(1, 0, 0), z_dir=(0, 0, -1))):
        with Locations((21, -69)):
            Circle(F8_R)
        with BuildLine():
            ThreePointArc((62.65, -69), (62.166726, -67.833274), (61, -67.35))
            Line((61, -67.35), (61, -69))
            Line((61, -69), (59.35, -69))
            ThreePointArc((59.35, -69), (61, -70.65), (62.65, -69))
        make_face()
        with BuildLine():
            Line((61, -69), (61, -67.35))
            ThreePointArc((61, -67.35), (59.833274, -67.833274), (59.35, -69))
            Line((59.35, -69), (61, -69))
        make_face()
        with BuildLine():
            ThreePointArc((62.65, -9), (61, -7.35), (59.35, -9))
            Line((59.35, -9), (61, -9))
            Line((61, -9), (61, -10.65))
            ThreePointArc((61, -10.65), (62.166726, -10.166726), (62.65, -9))
        make_face()
        with BuildLine():
            Line((61, -9), (59.35, -9))
            ThreePointArc((59.35, -9), (59.833274, -10.166726), (61, -10.65))
            Line((61, -10.65), (61, -9))
        make_face()
        with Locations((21, -9)):
            Circle(F8_R)
    extrude(amount=-F9_DEPTH, mode=Mode.SUBTRACT)

    # F10 (on face) → F11 (cut)
    with BuildSketch(Plane(origin=(0, 0, 0), x_dir=(1, 0, 0), z_dir=(0, 0, -1))):
        with Locations((21, -9)):
            Circle(F10_R)
        with Locations((61, -9)):
            Circle(F10_R)
        with Locations((61, -69)):
            Circle(F10_R)
        with Locations((21, -69)):
            Circle(F10_R)
    extrude(amount=-F11_DEPTH, mode=Mode.SUBTRACT)

    # F12 (on face) → F13 (cut)
    with BuildSketch(Plane(origin=(0, 0, 0), x_dir=(1, 0, 0), z_dir=(0, 0, -1))):
        with BuildLine():
            ThreePointArc((12.5, -9), (9.93934, -7.93934), (11, -10.5))
            Line((11, -10.5), (11, -9))
            Line((11, -9), (12.5, -9))
        make_face()
        with BuildLine():
            Line((11, -9), (11, -10.5))
            ThreePointArc((11, -10.5), (12.06066, -10.06066), (12.5, -9))
            Line((12.5, -9), (11, -9))
        make_face()
        with BuildLine():
            ThreePointArc((69.5, -9), (69.93934, -10.06066), (71, -10.5))
            Line((71, -10.5), (71, -9))
            Line((71, -9), (69.5, -9))
        make_face()
        with BuildLine():
            Line((71, -9), (71, -10.5))
            ThreePointArc((71, -10.5), (72.06066, -10.06066), (72.5, -9))
            ThreePointArc((72.5, -9), (71, -7.5), (69.5, -9))
            Line((69.5, -9), (71, -9))
        make_face()
        with BuildLine():
            ThreePointArc((71, -67.5), (69.93934, -67.93934), (69.5, -69))
            Line((69.5, -69), (71, -69))
            Line((71, -69), (71, -67.5))
        make_face()
        with BuildLine():
            Line((71, -69), (69.5, -69))
            ThreePointArc((69.5, -69), (71, -70.5), (72.5, -69))
            ThreePointArc((72.5, -69), (72.06066, -67.93934), (71, -67.5))
            Line((71, -67.5), (71, -69))
        make_face()
        with BuildLine():
            ThreePointArc((11, -67.5), (9.93934, -70.06066), (12.5, -69))
            Line((12.5, -69), (11, -69))
            Line((11, -69), (11, -67.5))
        make_face()
        with BuildLine():
            Line((11, -69), (12.5, -69))
            ThreePointArc((12.5, -69), (12.06066, -67.93934), (11, -67.5))
            Line((11, -67.5), (11, -69))
        make_face()
    extrude(amount=-F13_DEPTH, mode=Mode.SUBTRACT)


solid = f1.part
